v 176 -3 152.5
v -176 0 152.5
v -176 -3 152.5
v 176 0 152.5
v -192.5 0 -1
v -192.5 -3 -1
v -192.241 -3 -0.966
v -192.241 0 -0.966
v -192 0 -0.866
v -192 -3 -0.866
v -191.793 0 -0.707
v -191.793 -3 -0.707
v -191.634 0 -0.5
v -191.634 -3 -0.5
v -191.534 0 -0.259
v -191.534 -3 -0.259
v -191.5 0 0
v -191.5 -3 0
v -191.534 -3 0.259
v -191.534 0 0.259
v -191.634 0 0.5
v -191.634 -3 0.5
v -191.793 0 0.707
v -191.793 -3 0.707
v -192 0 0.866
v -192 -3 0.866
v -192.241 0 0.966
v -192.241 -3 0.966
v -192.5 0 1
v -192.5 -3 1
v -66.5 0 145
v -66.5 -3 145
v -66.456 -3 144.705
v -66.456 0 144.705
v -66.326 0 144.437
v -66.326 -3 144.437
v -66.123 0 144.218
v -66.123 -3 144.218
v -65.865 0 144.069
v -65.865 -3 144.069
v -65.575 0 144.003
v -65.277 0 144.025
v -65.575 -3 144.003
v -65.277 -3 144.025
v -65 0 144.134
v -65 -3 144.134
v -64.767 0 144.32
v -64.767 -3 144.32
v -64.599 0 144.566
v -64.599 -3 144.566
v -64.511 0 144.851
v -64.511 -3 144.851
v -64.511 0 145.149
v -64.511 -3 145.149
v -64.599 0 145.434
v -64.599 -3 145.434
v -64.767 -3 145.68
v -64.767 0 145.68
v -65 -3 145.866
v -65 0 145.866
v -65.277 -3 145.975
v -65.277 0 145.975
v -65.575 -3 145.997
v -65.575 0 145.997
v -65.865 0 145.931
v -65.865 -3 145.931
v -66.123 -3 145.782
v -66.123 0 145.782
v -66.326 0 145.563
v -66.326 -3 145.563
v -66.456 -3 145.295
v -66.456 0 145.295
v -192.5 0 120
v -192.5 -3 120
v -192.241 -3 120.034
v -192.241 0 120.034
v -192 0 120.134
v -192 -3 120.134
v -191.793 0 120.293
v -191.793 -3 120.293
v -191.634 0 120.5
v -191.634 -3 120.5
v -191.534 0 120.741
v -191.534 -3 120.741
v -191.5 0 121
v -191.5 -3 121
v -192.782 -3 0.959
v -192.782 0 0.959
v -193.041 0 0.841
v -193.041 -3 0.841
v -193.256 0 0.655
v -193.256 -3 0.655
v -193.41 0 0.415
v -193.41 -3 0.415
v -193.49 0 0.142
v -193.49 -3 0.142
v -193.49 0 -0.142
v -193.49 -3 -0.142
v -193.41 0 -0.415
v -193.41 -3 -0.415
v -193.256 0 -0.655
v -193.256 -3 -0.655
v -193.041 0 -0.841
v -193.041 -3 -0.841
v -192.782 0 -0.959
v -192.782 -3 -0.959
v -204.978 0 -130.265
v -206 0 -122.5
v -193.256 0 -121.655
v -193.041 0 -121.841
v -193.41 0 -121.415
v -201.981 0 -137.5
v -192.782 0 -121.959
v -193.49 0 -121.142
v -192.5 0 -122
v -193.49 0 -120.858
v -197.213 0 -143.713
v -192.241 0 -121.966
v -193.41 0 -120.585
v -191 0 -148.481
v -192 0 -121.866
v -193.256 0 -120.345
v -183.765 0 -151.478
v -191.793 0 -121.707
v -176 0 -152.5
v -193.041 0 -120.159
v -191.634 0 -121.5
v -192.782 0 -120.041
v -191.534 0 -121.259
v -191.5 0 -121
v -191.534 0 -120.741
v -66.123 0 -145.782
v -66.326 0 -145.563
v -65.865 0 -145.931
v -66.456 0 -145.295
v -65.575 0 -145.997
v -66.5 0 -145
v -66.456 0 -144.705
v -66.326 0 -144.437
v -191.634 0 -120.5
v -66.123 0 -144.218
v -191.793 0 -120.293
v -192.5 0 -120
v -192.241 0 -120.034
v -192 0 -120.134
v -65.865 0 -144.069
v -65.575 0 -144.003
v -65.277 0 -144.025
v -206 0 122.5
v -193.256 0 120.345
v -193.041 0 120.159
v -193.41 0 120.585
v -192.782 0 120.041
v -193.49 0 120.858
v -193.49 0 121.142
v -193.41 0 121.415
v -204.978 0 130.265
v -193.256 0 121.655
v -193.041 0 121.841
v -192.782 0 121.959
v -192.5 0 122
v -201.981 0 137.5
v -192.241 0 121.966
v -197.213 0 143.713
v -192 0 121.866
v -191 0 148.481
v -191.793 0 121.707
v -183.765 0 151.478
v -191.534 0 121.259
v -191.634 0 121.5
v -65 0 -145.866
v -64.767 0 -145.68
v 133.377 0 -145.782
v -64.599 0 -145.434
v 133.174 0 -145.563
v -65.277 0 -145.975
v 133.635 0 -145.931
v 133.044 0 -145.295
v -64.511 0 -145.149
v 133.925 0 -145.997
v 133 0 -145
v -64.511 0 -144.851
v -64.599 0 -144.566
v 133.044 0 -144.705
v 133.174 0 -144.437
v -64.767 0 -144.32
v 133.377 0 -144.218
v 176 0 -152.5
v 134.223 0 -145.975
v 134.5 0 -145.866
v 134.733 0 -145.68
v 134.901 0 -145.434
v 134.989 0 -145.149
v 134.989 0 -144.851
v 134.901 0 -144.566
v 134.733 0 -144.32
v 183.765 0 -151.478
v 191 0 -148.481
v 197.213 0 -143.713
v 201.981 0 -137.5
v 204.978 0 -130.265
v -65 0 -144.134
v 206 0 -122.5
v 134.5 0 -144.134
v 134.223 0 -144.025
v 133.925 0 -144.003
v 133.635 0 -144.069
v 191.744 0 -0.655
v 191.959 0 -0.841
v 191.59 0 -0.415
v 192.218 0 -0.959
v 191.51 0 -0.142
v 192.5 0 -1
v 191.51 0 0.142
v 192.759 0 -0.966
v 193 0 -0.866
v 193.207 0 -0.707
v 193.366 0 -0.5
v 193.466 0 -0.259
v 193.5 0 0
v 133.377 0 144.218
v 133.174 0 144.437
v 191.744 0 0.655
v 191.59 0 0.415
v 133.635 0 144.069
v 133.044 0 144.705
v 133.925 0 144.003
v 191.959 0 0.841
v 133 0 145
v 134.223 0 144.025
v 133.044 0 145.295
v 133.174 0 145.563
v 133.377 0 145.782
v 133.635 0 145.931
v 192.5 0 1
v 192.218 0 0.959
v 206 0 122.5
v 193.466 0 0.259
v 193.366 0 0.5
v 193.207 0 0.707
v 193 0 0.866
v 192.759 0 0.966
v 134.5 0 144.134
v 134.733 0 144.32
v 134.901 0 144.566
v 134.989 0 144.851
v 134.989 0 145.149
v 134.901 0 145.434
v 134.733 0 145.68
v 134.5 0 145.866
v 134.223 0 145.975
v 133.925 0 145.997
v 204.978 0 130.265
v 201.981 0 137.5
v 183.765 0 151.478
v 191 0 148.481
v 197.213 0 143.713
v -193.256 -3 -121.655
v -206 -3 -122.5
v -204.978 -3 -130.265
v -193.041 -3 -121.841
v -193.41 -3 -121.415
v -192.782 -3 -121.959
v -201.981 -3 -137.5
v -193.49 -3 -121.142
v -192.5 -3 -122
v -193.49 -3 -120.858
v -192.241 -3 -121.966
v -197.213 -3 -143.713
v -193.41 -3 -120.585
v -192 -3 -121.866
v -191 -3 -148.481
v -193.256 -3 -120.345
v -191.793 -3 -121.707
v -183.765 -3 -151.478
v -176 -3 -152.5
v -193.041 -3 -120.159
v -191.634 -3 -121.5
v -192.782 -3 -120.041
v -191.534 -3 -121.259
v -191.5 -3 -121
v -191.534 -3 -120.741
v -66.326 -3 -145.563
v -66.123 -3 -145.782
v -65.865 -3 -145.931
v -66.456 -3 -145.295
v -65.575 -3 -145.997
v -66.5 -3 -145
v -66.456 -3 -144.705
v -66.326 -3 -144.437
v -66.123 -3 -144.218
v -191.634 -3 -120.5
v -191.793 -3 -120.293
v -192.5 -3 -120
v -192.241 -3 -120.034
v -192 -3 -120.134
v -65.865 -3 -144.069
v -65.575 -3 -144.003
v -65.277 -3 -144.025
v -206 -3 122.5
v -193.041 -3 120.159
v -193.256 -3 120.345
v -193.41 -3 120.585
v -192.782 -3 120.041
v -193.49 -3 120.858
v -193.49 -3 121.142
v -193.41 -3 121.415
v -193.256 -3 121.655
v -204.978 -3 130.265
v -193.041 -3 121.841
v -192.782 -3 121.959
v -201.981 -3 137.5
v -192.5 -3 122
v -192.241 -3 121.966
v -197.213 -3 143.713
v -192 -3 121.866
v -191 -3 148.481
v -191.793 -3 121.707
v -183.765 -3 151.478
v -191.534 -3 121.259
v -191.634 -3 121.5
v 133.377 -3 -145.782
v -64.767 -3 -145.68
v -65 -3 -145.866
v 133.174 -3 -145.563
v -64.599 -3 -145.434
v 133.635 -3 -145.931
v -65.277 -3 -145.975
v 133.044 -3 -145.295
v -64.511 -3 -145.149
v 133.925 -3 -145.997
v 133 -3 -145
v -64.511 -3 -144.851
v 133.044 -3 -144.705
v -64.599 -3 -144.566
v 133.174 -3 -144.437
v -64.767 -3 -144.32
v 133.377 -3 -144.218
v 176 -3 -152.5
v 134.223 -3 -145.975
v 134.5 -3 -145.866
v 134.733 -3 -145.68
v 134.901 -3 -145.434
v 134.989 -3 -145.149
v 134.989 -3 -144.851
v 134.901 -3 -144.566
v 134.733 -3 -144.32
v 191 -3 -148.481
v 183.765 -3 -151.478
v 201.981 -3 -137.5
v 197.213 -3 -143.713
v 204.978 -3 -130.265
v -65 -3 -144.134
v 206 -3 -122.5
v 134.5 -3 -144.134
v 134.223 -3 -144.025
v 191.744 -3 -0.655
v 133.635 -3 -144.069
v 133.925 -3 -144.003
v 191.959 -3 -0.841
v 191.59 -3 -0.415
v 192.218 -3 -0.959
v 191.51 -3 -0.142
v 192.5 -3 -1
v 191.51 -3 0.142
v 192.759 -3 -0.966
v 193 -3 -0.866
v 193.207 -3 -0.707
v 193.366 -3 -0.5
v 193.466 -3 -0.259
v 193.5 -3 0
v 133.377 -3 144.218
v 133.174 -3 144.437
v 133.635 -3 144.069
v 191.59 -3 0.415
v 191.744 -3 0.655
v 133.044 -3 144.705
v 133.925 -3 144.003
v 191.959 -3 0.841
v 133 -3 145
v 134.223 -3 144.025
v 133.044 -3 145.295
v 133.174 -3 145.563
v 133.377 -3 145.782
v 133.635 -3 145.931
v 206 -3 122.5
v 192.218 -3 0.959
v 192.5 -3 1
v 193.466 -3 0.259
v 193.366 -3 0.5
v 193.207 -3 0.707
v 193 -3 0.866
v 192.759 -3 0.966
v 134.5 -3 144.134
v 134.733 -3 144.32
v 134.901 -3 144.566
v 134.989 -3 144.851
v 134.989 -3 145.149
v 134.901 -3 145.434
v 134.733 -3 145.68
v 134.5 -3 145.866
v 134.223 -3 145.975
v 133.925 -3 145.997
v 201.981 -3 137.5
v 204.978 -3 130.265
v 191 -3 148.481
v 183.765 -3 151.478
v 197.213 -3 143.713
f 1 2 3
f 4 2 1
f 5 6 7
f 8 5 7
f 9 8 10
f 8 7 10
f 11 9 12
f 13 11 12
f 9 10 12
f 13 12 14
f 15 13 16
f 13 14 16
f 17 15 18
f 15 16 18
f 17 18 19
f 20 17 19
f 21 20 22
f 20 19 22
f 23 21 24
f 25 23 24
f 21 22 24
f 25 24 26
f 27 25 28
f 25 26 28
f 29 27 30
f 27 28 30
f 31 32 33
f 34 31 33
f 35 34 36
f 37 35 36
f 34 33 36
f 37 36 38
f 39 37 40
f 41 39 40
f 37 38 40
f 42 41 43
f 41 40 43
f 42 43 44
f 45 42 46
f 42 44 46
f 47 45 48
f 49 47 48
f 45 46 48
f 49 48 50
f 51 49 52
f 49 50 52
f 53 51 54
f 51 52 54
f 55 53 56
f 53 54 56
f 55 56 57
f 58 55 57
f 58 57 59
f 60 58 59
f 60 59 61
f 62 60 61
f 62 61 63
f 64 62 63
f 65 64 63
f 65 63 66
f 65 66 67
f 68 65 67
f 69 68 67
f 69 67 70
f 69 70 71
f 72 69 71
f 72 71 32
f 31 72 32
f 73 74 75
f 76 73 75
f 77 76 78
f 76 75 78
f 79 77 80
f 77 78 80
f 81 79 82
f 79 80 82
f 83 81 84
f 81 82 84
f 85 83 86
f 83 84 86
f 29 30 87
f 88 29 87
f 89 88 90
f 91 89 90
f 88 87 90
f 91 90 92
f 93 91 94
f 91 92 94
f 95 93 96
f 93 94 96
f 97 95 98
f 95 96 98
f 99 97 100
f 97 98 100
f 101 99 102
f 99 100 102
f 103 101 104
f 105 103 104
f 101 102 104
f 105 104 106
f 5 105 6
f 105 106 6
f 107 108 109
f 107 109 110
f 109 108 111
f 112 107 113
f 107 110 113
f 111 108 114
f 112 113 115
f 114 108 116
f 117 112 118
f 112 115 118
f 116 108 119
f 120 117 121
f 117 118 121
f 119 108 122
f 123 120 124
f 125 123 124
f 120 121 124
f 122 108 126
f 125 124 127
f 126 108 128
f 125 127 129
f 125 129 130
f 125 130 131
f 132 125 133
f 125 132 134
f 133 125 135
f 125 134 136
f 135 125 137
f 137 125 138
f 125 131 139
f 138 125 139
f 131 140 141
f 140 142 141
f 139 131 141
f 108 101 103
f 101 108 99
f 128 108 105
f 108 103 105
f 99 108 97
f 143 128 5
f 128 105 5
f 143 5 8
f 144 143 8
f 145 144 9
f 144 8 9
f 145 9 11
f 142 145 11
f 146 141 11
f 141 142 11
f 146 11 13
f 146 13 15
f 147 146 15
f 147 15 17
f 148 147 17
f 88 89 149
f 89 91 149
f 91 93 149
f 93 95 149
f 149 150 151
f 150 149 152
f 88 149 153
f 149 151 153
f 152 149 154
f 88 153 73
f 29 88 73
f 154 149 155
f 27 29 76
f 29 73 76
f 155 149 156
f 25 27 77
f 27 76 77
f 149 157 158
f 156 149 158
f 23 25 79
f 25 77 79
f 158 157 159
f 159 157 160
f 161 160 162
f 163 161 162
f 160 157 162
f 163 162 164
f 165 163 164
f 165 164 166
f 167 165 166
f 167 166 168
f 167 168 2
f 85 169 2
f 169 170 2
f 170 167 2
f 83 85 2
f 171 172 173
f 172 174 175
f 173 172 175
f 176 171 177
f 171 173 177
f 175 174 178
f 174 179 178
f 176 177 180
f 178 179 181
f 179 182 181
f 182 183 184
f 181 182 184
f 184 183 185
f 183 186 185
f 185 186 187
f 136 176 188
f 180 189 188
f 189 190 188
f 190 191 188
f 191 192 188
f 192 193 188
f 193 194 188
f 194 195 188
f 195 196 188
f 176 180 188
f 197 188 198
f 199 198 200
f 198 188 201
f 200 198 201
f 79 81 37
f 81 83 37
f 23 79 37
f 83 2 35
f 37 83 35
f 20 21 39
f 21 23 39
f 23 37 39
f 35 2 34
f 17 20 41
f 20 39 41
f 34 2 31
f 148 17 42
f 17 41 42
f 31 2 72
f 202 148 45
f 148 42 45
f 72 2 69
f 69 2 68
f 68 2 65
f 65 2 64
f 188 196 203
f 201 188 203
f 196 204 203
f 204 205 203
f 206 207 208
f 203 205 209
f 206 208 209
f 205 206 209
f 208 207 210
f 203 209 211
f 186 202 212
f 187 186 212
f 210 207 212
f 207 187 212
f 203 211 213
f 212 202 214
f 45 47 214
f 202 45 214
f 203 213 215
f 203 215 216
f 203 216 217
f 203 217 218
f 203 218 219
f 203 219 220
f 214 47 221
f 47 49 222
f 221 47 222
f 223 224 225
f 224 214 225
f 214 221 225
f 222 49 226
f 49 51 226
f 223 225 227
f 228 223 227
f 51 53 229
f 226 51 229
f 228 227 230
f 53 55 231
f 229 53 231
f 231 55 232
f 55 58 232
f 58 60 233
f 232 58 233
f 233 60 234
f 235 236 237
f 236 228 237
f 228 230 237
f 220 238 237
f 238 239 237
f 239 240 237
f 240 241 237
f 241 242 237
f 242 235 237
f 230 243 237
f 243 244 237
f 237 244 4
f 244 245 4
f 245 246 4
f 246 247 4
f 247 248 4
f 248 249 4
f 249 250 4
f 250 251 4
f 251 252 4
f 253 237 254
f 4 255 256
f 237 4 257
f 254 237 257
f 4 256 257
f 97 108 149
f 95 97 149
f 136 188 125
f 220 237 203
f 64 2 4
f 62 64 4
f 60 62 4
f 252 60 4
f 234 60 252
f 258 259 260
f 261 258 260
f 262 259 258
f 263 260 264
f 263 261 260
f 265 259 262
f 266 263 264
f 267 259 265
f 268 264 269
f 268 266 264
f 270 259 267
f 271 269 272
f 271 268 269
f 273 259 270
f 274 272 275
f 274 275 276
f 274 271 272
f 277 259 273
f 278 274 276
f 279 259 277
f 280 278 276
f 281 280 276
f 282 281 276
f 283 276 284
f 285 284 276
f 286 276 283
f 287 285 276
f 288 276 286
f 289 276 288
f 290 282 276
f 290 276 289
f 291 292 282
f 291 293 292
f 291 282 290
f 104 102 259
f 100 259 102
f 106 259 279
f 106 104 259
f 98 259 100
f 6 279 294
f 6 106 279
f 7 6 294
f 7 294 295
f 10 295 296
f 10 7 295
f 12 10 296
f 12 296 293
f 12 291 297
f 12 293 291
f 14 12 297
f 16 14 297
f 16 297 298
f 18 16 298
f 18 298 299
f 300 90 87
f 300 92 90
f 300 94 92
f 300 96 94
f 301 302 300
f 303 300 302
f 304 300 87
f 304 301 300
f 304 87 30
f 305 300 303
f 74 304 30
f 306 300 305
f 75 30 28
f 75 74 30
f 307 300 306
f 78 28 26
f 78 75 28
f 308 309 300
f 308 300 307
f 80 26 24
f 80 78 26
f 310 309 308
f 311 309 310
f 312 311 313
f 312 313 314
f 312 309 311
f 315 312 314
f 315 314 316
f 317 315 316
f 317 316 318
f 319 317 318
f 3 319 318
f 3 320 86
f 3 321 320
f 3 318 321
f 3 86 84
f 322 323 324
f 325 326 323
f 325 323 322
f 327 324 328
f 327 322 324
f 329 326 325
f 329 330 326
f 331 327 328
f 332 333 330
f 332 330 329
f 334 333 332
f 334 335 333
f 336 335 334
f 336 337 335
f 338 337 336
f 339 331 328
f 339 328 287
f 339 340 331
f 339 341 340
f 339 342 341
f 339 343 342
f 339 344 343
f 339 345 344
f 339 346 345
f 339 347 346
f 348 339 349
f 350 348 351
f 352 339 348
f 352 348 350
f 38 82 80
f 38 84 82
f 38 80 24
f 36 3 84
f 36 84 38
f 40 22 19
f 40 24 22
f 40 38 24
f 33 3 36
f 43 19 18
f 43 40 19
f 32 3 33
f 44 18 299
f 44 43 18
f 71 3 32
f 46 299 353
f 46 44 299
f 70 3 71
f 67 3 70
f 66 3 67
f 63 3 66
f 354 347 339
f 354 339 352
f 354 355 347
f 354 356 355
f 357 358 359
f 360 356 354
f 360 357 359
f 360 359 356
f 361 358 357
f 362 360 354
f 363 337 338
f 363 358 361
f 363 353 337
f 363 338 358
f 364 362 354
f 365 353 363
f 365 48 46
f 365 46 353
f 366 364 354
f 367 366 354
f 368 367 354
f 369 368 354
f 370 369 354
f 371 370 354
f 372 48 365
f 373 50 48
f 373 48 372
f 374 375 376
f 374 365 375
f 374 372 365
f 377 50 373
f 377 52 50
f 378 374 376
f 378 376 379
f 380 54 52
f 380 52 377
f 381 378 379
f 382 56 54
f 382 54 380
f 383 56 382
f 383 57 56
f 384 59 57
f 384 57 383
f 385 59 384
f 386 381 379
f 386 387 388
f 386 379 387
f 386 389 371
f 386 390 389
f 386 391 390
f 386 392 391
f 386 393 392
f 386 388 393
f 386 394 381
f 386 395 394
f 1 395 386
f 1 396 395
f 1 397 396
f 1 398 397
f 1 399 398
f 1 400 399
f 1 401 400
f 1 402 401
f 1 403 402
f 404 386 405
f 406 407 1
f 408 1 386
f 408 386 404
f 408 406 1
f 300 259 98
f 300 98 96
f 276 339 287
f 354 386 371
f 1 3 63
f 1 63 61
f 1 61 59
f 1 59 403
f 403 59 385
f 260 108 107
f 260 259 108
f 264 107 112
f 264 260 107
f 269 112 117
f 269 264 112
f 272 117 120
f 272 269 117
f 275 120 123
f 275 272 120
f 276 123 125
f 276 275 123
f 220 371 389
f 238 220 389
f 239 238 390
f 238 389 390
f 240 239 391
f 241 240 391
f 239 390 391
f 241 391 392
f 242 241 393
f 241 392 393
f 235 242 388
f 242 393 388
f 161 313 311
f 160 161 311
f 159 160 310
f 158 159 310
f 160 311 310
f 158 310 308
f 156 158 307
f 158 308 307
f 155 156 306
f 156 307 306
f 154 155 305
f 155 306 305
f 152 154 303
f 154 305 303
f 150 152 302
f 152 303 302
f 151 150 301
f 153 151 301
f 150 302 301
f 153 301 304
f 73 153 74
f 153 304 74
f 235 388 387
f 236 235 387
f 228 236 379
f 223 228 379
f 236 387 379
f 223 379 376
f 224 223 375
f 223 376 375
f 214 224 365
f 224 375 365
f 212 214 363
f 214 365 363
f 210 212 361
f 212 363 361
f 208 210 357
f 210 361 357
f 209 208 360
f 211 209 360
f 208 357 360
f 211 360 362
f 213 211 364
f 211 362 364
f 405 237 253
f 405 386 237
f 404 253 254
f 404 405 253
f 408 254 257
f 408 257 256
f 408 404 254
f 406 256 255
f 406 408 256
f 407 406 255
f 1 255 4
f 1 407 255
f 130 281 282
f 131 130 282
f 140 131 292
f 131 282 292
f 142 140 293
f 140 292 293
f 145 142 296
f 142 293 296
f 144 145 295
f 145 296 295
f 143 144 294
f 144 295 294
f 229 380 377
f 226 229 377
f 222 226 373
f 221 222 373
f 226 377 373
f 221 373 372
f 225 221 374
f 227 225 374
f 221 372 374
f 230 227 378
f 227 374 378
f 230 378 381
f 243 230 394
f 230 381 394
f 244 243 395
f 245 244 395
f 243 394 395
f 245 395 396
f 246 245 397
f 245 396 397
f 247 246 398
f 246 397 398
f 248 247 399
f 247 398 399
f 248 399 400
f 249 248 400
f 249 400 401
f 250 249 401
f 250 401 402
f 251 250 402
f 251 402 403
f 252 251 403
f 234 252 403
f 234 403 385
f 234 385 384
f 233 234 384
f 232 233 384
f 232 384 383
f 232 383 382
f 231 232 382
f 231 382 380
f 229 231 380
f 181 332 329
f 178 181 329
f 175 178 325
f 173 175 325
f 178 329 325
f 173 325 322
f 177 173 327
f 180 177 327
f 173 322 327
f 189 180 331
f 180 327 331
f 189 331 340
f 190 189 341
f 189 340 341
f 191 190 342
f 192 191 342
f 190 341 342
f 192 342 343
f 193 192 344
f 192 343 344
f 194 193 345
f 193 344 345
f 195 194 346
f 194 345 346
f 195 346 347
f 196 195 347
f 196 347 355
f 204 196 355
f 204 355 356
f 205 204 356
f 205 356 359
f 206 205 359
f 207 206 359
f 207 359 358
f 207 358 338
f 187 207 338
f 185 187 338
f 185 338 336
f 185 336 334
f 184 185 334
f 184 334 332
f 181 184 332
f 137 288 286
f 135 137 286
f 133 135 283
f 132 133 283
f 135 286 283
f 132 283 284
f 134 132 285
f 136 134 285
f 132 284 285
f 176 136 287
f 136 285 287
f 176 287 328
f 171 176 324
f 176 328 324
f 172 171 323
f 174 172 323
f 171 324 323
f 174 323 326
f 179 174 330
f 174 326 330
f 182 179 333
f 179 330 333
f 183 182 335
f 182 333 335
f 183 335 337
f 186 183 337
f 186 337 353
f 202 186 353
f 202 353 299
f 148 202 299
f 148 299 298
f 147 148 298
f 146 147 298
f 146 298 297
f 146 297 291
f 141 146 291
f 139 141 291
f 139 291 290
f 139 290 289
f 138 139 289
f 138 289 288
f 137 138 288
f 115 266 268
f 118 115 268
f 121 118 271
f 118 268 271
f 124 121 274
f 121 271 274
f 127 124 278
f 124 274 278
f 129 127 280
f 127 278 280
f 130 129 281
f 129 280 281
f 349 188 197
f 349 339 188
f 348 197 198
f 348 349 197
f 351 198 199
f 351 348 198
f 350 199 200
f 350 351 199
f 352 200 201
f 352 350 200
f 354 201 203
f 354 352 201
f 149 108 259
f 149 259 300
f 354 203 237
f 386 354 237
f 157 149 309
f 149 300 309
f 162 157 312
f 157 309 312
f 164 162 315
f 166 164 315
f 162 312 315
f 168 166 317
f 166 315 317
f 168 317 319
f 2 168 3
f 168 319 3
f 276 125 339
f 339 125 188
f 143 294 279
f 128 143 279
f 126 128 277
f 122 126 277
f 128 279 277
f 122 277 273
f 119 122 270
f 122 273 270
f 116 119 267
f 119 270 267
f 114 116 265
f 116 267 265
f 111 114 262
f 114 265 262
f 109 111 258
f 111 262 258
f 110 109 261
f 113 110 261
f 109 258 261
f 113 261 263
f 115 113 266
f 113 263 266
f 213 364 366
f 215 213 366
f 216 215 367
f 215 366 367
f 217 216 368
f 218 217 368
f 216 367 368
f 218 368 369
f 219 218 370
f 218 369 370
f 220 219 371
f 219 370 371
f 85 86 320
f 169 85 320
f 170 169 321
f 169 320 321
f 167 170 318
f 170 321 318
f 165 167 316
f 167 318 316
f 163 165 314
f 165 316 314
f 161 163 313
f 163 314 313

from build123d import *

# Parameters (mm, degrees)
F0_W     = 412
F0_H     = 305
F1_DEPTH = 3
F2_R     = 30
F4_DEPTH = 25


with BuildPart() as f1:
    # F0 (on Front) → F1 (new body)
    with BuildSketch(Plane.XZ):
        Rectangle(F0_W, F0_H)
    extrude(amount=F1_DEPTH)

    # F2
    f2_edges = [f1.edges().sort_by_distance(p)[0] for p in [
        (-206, -1.5, 152.5),
        (206, -1.5, 152.5),
        (-206, -1.5, -152.5),
        (206, -1.5, -152.5),
    ]]
    fillet(f2_edges, radius=F2_R)

    # F3 (on face) → F4 (cut)
    with BuildSketch(Plane.XZ.offset(3)):
        with BuildLine():
            Line((-192.5, 120), (-192.5, 122))
            ThreePointArc((-192.5, 122), (-193.5, 121), (-192.5, 120))
        make_face()
        with BuildLine():
            ThreePointArc((-191.5, 121), (-191.7928932188, 121.7071067812), (-192.5, 122))
            Line((-192.5, 122), (-192.5, 120))
            ThreePointArc((-192.5, 120), (-191.7928932188, 120.2928932188), (-191.5, 121))
        make_face()
        with BuildLine():
            Line((-66.5, 145), (-64.5, 145))
            ThreePointArc((-64.5, 145), (-65.5, 146), (-66.5, 145))
        make_face()
        with BuildLine():
            ThreePointArc((-66.5, 145), (-65.5, 144), (-64.5, 145))
            Line((-64.5, 145), (-66.5, 145))
        make_face()
        with BuildLine():
            Line((133, 145), (135, 145))
            ThreePointArc((135, 145), (134, 146), (133, 145))
        make_face()
        with BuildLine():
            ThreePointArc((133, 145), (134, 144), (135, 145))
            Line((135, 145), (133, 145))
        make_face()
        with BuildLine():
            Line((192.5, -1), (192.5, 1))
            ThreePointArc((192.5, 1), (191.5, 0), (192.5, -1))
        make_face()
        with BuildLine():
            ThreePointArc((193.5, 0), (193.2071067812, 0.7071067812), (192.5, 1))
            Line((192.5, 1), (192.5, -1))
            ThreePointArc((192.5, -1), (193.2071067812, -0.7071067812), (193.5, 0))
        make_face()
        with BuildLine():
            Line((133, -145), (135, -145))
            ThreePointArc((135, -145), (134, -144), (133, -145))
        make_face()
        with BuildLine():
            ThreePointArc((133, -145), (134, -146), (135, -145))
            Line((135, -145), (133, -145))
        make_face()
        with BuildLine():
            Line((-66.5, -145), (-64.5, -145))
            ThreePointArc((-64.5, -145), (-65.5, -144), (-66.5, -145))
        make_face()
        with BuildLine():
            ThreePointArc((-66.5, -145), (-65.5, -146), (-64.5, -145))
            Line((-64.5, -145), (-66.5, -145))
        make_face()
        with BuildLine():
            Line((-192.5, -122), (-192.5, -120))
            ThreePointArc((-192.5, -120), (-193.5, -121), (-192.5, -122))
        make_face()
        with BuildLine():
            ThreePointArc((-191.5, -121), (-191.7928932188, -120.2928932188), (-192.5, -120))
            Line((-192.5, -120), (-192.5, -122))
            ThreePointArc((-192.5, -122), (-191.7928932188, -121.7071067812), (-191.5, -121))
        make_face()
        with BuildLine():
            Line((-192.5, -1), (-192.5, 1))
            ThreePointArc((-192.5, 1), (-193.5, 0), (-192.5, -1))
        make_face()
        with BuildLine():
            ThreePointArc((-191.5, 0), (-191.7928932188, 0.7071067812), (-192.5, 1))
            Line((-192.5, 1), (-192.5, -1))
            ThreePointArc((-192.5, -1), (-191.7928932188, -0.7071067812), (-191.5, 0))
        make_face()
    extrude(amount=-F4_DEPTH, mode=Mode.SUBTRACT)


solid = f1.part
